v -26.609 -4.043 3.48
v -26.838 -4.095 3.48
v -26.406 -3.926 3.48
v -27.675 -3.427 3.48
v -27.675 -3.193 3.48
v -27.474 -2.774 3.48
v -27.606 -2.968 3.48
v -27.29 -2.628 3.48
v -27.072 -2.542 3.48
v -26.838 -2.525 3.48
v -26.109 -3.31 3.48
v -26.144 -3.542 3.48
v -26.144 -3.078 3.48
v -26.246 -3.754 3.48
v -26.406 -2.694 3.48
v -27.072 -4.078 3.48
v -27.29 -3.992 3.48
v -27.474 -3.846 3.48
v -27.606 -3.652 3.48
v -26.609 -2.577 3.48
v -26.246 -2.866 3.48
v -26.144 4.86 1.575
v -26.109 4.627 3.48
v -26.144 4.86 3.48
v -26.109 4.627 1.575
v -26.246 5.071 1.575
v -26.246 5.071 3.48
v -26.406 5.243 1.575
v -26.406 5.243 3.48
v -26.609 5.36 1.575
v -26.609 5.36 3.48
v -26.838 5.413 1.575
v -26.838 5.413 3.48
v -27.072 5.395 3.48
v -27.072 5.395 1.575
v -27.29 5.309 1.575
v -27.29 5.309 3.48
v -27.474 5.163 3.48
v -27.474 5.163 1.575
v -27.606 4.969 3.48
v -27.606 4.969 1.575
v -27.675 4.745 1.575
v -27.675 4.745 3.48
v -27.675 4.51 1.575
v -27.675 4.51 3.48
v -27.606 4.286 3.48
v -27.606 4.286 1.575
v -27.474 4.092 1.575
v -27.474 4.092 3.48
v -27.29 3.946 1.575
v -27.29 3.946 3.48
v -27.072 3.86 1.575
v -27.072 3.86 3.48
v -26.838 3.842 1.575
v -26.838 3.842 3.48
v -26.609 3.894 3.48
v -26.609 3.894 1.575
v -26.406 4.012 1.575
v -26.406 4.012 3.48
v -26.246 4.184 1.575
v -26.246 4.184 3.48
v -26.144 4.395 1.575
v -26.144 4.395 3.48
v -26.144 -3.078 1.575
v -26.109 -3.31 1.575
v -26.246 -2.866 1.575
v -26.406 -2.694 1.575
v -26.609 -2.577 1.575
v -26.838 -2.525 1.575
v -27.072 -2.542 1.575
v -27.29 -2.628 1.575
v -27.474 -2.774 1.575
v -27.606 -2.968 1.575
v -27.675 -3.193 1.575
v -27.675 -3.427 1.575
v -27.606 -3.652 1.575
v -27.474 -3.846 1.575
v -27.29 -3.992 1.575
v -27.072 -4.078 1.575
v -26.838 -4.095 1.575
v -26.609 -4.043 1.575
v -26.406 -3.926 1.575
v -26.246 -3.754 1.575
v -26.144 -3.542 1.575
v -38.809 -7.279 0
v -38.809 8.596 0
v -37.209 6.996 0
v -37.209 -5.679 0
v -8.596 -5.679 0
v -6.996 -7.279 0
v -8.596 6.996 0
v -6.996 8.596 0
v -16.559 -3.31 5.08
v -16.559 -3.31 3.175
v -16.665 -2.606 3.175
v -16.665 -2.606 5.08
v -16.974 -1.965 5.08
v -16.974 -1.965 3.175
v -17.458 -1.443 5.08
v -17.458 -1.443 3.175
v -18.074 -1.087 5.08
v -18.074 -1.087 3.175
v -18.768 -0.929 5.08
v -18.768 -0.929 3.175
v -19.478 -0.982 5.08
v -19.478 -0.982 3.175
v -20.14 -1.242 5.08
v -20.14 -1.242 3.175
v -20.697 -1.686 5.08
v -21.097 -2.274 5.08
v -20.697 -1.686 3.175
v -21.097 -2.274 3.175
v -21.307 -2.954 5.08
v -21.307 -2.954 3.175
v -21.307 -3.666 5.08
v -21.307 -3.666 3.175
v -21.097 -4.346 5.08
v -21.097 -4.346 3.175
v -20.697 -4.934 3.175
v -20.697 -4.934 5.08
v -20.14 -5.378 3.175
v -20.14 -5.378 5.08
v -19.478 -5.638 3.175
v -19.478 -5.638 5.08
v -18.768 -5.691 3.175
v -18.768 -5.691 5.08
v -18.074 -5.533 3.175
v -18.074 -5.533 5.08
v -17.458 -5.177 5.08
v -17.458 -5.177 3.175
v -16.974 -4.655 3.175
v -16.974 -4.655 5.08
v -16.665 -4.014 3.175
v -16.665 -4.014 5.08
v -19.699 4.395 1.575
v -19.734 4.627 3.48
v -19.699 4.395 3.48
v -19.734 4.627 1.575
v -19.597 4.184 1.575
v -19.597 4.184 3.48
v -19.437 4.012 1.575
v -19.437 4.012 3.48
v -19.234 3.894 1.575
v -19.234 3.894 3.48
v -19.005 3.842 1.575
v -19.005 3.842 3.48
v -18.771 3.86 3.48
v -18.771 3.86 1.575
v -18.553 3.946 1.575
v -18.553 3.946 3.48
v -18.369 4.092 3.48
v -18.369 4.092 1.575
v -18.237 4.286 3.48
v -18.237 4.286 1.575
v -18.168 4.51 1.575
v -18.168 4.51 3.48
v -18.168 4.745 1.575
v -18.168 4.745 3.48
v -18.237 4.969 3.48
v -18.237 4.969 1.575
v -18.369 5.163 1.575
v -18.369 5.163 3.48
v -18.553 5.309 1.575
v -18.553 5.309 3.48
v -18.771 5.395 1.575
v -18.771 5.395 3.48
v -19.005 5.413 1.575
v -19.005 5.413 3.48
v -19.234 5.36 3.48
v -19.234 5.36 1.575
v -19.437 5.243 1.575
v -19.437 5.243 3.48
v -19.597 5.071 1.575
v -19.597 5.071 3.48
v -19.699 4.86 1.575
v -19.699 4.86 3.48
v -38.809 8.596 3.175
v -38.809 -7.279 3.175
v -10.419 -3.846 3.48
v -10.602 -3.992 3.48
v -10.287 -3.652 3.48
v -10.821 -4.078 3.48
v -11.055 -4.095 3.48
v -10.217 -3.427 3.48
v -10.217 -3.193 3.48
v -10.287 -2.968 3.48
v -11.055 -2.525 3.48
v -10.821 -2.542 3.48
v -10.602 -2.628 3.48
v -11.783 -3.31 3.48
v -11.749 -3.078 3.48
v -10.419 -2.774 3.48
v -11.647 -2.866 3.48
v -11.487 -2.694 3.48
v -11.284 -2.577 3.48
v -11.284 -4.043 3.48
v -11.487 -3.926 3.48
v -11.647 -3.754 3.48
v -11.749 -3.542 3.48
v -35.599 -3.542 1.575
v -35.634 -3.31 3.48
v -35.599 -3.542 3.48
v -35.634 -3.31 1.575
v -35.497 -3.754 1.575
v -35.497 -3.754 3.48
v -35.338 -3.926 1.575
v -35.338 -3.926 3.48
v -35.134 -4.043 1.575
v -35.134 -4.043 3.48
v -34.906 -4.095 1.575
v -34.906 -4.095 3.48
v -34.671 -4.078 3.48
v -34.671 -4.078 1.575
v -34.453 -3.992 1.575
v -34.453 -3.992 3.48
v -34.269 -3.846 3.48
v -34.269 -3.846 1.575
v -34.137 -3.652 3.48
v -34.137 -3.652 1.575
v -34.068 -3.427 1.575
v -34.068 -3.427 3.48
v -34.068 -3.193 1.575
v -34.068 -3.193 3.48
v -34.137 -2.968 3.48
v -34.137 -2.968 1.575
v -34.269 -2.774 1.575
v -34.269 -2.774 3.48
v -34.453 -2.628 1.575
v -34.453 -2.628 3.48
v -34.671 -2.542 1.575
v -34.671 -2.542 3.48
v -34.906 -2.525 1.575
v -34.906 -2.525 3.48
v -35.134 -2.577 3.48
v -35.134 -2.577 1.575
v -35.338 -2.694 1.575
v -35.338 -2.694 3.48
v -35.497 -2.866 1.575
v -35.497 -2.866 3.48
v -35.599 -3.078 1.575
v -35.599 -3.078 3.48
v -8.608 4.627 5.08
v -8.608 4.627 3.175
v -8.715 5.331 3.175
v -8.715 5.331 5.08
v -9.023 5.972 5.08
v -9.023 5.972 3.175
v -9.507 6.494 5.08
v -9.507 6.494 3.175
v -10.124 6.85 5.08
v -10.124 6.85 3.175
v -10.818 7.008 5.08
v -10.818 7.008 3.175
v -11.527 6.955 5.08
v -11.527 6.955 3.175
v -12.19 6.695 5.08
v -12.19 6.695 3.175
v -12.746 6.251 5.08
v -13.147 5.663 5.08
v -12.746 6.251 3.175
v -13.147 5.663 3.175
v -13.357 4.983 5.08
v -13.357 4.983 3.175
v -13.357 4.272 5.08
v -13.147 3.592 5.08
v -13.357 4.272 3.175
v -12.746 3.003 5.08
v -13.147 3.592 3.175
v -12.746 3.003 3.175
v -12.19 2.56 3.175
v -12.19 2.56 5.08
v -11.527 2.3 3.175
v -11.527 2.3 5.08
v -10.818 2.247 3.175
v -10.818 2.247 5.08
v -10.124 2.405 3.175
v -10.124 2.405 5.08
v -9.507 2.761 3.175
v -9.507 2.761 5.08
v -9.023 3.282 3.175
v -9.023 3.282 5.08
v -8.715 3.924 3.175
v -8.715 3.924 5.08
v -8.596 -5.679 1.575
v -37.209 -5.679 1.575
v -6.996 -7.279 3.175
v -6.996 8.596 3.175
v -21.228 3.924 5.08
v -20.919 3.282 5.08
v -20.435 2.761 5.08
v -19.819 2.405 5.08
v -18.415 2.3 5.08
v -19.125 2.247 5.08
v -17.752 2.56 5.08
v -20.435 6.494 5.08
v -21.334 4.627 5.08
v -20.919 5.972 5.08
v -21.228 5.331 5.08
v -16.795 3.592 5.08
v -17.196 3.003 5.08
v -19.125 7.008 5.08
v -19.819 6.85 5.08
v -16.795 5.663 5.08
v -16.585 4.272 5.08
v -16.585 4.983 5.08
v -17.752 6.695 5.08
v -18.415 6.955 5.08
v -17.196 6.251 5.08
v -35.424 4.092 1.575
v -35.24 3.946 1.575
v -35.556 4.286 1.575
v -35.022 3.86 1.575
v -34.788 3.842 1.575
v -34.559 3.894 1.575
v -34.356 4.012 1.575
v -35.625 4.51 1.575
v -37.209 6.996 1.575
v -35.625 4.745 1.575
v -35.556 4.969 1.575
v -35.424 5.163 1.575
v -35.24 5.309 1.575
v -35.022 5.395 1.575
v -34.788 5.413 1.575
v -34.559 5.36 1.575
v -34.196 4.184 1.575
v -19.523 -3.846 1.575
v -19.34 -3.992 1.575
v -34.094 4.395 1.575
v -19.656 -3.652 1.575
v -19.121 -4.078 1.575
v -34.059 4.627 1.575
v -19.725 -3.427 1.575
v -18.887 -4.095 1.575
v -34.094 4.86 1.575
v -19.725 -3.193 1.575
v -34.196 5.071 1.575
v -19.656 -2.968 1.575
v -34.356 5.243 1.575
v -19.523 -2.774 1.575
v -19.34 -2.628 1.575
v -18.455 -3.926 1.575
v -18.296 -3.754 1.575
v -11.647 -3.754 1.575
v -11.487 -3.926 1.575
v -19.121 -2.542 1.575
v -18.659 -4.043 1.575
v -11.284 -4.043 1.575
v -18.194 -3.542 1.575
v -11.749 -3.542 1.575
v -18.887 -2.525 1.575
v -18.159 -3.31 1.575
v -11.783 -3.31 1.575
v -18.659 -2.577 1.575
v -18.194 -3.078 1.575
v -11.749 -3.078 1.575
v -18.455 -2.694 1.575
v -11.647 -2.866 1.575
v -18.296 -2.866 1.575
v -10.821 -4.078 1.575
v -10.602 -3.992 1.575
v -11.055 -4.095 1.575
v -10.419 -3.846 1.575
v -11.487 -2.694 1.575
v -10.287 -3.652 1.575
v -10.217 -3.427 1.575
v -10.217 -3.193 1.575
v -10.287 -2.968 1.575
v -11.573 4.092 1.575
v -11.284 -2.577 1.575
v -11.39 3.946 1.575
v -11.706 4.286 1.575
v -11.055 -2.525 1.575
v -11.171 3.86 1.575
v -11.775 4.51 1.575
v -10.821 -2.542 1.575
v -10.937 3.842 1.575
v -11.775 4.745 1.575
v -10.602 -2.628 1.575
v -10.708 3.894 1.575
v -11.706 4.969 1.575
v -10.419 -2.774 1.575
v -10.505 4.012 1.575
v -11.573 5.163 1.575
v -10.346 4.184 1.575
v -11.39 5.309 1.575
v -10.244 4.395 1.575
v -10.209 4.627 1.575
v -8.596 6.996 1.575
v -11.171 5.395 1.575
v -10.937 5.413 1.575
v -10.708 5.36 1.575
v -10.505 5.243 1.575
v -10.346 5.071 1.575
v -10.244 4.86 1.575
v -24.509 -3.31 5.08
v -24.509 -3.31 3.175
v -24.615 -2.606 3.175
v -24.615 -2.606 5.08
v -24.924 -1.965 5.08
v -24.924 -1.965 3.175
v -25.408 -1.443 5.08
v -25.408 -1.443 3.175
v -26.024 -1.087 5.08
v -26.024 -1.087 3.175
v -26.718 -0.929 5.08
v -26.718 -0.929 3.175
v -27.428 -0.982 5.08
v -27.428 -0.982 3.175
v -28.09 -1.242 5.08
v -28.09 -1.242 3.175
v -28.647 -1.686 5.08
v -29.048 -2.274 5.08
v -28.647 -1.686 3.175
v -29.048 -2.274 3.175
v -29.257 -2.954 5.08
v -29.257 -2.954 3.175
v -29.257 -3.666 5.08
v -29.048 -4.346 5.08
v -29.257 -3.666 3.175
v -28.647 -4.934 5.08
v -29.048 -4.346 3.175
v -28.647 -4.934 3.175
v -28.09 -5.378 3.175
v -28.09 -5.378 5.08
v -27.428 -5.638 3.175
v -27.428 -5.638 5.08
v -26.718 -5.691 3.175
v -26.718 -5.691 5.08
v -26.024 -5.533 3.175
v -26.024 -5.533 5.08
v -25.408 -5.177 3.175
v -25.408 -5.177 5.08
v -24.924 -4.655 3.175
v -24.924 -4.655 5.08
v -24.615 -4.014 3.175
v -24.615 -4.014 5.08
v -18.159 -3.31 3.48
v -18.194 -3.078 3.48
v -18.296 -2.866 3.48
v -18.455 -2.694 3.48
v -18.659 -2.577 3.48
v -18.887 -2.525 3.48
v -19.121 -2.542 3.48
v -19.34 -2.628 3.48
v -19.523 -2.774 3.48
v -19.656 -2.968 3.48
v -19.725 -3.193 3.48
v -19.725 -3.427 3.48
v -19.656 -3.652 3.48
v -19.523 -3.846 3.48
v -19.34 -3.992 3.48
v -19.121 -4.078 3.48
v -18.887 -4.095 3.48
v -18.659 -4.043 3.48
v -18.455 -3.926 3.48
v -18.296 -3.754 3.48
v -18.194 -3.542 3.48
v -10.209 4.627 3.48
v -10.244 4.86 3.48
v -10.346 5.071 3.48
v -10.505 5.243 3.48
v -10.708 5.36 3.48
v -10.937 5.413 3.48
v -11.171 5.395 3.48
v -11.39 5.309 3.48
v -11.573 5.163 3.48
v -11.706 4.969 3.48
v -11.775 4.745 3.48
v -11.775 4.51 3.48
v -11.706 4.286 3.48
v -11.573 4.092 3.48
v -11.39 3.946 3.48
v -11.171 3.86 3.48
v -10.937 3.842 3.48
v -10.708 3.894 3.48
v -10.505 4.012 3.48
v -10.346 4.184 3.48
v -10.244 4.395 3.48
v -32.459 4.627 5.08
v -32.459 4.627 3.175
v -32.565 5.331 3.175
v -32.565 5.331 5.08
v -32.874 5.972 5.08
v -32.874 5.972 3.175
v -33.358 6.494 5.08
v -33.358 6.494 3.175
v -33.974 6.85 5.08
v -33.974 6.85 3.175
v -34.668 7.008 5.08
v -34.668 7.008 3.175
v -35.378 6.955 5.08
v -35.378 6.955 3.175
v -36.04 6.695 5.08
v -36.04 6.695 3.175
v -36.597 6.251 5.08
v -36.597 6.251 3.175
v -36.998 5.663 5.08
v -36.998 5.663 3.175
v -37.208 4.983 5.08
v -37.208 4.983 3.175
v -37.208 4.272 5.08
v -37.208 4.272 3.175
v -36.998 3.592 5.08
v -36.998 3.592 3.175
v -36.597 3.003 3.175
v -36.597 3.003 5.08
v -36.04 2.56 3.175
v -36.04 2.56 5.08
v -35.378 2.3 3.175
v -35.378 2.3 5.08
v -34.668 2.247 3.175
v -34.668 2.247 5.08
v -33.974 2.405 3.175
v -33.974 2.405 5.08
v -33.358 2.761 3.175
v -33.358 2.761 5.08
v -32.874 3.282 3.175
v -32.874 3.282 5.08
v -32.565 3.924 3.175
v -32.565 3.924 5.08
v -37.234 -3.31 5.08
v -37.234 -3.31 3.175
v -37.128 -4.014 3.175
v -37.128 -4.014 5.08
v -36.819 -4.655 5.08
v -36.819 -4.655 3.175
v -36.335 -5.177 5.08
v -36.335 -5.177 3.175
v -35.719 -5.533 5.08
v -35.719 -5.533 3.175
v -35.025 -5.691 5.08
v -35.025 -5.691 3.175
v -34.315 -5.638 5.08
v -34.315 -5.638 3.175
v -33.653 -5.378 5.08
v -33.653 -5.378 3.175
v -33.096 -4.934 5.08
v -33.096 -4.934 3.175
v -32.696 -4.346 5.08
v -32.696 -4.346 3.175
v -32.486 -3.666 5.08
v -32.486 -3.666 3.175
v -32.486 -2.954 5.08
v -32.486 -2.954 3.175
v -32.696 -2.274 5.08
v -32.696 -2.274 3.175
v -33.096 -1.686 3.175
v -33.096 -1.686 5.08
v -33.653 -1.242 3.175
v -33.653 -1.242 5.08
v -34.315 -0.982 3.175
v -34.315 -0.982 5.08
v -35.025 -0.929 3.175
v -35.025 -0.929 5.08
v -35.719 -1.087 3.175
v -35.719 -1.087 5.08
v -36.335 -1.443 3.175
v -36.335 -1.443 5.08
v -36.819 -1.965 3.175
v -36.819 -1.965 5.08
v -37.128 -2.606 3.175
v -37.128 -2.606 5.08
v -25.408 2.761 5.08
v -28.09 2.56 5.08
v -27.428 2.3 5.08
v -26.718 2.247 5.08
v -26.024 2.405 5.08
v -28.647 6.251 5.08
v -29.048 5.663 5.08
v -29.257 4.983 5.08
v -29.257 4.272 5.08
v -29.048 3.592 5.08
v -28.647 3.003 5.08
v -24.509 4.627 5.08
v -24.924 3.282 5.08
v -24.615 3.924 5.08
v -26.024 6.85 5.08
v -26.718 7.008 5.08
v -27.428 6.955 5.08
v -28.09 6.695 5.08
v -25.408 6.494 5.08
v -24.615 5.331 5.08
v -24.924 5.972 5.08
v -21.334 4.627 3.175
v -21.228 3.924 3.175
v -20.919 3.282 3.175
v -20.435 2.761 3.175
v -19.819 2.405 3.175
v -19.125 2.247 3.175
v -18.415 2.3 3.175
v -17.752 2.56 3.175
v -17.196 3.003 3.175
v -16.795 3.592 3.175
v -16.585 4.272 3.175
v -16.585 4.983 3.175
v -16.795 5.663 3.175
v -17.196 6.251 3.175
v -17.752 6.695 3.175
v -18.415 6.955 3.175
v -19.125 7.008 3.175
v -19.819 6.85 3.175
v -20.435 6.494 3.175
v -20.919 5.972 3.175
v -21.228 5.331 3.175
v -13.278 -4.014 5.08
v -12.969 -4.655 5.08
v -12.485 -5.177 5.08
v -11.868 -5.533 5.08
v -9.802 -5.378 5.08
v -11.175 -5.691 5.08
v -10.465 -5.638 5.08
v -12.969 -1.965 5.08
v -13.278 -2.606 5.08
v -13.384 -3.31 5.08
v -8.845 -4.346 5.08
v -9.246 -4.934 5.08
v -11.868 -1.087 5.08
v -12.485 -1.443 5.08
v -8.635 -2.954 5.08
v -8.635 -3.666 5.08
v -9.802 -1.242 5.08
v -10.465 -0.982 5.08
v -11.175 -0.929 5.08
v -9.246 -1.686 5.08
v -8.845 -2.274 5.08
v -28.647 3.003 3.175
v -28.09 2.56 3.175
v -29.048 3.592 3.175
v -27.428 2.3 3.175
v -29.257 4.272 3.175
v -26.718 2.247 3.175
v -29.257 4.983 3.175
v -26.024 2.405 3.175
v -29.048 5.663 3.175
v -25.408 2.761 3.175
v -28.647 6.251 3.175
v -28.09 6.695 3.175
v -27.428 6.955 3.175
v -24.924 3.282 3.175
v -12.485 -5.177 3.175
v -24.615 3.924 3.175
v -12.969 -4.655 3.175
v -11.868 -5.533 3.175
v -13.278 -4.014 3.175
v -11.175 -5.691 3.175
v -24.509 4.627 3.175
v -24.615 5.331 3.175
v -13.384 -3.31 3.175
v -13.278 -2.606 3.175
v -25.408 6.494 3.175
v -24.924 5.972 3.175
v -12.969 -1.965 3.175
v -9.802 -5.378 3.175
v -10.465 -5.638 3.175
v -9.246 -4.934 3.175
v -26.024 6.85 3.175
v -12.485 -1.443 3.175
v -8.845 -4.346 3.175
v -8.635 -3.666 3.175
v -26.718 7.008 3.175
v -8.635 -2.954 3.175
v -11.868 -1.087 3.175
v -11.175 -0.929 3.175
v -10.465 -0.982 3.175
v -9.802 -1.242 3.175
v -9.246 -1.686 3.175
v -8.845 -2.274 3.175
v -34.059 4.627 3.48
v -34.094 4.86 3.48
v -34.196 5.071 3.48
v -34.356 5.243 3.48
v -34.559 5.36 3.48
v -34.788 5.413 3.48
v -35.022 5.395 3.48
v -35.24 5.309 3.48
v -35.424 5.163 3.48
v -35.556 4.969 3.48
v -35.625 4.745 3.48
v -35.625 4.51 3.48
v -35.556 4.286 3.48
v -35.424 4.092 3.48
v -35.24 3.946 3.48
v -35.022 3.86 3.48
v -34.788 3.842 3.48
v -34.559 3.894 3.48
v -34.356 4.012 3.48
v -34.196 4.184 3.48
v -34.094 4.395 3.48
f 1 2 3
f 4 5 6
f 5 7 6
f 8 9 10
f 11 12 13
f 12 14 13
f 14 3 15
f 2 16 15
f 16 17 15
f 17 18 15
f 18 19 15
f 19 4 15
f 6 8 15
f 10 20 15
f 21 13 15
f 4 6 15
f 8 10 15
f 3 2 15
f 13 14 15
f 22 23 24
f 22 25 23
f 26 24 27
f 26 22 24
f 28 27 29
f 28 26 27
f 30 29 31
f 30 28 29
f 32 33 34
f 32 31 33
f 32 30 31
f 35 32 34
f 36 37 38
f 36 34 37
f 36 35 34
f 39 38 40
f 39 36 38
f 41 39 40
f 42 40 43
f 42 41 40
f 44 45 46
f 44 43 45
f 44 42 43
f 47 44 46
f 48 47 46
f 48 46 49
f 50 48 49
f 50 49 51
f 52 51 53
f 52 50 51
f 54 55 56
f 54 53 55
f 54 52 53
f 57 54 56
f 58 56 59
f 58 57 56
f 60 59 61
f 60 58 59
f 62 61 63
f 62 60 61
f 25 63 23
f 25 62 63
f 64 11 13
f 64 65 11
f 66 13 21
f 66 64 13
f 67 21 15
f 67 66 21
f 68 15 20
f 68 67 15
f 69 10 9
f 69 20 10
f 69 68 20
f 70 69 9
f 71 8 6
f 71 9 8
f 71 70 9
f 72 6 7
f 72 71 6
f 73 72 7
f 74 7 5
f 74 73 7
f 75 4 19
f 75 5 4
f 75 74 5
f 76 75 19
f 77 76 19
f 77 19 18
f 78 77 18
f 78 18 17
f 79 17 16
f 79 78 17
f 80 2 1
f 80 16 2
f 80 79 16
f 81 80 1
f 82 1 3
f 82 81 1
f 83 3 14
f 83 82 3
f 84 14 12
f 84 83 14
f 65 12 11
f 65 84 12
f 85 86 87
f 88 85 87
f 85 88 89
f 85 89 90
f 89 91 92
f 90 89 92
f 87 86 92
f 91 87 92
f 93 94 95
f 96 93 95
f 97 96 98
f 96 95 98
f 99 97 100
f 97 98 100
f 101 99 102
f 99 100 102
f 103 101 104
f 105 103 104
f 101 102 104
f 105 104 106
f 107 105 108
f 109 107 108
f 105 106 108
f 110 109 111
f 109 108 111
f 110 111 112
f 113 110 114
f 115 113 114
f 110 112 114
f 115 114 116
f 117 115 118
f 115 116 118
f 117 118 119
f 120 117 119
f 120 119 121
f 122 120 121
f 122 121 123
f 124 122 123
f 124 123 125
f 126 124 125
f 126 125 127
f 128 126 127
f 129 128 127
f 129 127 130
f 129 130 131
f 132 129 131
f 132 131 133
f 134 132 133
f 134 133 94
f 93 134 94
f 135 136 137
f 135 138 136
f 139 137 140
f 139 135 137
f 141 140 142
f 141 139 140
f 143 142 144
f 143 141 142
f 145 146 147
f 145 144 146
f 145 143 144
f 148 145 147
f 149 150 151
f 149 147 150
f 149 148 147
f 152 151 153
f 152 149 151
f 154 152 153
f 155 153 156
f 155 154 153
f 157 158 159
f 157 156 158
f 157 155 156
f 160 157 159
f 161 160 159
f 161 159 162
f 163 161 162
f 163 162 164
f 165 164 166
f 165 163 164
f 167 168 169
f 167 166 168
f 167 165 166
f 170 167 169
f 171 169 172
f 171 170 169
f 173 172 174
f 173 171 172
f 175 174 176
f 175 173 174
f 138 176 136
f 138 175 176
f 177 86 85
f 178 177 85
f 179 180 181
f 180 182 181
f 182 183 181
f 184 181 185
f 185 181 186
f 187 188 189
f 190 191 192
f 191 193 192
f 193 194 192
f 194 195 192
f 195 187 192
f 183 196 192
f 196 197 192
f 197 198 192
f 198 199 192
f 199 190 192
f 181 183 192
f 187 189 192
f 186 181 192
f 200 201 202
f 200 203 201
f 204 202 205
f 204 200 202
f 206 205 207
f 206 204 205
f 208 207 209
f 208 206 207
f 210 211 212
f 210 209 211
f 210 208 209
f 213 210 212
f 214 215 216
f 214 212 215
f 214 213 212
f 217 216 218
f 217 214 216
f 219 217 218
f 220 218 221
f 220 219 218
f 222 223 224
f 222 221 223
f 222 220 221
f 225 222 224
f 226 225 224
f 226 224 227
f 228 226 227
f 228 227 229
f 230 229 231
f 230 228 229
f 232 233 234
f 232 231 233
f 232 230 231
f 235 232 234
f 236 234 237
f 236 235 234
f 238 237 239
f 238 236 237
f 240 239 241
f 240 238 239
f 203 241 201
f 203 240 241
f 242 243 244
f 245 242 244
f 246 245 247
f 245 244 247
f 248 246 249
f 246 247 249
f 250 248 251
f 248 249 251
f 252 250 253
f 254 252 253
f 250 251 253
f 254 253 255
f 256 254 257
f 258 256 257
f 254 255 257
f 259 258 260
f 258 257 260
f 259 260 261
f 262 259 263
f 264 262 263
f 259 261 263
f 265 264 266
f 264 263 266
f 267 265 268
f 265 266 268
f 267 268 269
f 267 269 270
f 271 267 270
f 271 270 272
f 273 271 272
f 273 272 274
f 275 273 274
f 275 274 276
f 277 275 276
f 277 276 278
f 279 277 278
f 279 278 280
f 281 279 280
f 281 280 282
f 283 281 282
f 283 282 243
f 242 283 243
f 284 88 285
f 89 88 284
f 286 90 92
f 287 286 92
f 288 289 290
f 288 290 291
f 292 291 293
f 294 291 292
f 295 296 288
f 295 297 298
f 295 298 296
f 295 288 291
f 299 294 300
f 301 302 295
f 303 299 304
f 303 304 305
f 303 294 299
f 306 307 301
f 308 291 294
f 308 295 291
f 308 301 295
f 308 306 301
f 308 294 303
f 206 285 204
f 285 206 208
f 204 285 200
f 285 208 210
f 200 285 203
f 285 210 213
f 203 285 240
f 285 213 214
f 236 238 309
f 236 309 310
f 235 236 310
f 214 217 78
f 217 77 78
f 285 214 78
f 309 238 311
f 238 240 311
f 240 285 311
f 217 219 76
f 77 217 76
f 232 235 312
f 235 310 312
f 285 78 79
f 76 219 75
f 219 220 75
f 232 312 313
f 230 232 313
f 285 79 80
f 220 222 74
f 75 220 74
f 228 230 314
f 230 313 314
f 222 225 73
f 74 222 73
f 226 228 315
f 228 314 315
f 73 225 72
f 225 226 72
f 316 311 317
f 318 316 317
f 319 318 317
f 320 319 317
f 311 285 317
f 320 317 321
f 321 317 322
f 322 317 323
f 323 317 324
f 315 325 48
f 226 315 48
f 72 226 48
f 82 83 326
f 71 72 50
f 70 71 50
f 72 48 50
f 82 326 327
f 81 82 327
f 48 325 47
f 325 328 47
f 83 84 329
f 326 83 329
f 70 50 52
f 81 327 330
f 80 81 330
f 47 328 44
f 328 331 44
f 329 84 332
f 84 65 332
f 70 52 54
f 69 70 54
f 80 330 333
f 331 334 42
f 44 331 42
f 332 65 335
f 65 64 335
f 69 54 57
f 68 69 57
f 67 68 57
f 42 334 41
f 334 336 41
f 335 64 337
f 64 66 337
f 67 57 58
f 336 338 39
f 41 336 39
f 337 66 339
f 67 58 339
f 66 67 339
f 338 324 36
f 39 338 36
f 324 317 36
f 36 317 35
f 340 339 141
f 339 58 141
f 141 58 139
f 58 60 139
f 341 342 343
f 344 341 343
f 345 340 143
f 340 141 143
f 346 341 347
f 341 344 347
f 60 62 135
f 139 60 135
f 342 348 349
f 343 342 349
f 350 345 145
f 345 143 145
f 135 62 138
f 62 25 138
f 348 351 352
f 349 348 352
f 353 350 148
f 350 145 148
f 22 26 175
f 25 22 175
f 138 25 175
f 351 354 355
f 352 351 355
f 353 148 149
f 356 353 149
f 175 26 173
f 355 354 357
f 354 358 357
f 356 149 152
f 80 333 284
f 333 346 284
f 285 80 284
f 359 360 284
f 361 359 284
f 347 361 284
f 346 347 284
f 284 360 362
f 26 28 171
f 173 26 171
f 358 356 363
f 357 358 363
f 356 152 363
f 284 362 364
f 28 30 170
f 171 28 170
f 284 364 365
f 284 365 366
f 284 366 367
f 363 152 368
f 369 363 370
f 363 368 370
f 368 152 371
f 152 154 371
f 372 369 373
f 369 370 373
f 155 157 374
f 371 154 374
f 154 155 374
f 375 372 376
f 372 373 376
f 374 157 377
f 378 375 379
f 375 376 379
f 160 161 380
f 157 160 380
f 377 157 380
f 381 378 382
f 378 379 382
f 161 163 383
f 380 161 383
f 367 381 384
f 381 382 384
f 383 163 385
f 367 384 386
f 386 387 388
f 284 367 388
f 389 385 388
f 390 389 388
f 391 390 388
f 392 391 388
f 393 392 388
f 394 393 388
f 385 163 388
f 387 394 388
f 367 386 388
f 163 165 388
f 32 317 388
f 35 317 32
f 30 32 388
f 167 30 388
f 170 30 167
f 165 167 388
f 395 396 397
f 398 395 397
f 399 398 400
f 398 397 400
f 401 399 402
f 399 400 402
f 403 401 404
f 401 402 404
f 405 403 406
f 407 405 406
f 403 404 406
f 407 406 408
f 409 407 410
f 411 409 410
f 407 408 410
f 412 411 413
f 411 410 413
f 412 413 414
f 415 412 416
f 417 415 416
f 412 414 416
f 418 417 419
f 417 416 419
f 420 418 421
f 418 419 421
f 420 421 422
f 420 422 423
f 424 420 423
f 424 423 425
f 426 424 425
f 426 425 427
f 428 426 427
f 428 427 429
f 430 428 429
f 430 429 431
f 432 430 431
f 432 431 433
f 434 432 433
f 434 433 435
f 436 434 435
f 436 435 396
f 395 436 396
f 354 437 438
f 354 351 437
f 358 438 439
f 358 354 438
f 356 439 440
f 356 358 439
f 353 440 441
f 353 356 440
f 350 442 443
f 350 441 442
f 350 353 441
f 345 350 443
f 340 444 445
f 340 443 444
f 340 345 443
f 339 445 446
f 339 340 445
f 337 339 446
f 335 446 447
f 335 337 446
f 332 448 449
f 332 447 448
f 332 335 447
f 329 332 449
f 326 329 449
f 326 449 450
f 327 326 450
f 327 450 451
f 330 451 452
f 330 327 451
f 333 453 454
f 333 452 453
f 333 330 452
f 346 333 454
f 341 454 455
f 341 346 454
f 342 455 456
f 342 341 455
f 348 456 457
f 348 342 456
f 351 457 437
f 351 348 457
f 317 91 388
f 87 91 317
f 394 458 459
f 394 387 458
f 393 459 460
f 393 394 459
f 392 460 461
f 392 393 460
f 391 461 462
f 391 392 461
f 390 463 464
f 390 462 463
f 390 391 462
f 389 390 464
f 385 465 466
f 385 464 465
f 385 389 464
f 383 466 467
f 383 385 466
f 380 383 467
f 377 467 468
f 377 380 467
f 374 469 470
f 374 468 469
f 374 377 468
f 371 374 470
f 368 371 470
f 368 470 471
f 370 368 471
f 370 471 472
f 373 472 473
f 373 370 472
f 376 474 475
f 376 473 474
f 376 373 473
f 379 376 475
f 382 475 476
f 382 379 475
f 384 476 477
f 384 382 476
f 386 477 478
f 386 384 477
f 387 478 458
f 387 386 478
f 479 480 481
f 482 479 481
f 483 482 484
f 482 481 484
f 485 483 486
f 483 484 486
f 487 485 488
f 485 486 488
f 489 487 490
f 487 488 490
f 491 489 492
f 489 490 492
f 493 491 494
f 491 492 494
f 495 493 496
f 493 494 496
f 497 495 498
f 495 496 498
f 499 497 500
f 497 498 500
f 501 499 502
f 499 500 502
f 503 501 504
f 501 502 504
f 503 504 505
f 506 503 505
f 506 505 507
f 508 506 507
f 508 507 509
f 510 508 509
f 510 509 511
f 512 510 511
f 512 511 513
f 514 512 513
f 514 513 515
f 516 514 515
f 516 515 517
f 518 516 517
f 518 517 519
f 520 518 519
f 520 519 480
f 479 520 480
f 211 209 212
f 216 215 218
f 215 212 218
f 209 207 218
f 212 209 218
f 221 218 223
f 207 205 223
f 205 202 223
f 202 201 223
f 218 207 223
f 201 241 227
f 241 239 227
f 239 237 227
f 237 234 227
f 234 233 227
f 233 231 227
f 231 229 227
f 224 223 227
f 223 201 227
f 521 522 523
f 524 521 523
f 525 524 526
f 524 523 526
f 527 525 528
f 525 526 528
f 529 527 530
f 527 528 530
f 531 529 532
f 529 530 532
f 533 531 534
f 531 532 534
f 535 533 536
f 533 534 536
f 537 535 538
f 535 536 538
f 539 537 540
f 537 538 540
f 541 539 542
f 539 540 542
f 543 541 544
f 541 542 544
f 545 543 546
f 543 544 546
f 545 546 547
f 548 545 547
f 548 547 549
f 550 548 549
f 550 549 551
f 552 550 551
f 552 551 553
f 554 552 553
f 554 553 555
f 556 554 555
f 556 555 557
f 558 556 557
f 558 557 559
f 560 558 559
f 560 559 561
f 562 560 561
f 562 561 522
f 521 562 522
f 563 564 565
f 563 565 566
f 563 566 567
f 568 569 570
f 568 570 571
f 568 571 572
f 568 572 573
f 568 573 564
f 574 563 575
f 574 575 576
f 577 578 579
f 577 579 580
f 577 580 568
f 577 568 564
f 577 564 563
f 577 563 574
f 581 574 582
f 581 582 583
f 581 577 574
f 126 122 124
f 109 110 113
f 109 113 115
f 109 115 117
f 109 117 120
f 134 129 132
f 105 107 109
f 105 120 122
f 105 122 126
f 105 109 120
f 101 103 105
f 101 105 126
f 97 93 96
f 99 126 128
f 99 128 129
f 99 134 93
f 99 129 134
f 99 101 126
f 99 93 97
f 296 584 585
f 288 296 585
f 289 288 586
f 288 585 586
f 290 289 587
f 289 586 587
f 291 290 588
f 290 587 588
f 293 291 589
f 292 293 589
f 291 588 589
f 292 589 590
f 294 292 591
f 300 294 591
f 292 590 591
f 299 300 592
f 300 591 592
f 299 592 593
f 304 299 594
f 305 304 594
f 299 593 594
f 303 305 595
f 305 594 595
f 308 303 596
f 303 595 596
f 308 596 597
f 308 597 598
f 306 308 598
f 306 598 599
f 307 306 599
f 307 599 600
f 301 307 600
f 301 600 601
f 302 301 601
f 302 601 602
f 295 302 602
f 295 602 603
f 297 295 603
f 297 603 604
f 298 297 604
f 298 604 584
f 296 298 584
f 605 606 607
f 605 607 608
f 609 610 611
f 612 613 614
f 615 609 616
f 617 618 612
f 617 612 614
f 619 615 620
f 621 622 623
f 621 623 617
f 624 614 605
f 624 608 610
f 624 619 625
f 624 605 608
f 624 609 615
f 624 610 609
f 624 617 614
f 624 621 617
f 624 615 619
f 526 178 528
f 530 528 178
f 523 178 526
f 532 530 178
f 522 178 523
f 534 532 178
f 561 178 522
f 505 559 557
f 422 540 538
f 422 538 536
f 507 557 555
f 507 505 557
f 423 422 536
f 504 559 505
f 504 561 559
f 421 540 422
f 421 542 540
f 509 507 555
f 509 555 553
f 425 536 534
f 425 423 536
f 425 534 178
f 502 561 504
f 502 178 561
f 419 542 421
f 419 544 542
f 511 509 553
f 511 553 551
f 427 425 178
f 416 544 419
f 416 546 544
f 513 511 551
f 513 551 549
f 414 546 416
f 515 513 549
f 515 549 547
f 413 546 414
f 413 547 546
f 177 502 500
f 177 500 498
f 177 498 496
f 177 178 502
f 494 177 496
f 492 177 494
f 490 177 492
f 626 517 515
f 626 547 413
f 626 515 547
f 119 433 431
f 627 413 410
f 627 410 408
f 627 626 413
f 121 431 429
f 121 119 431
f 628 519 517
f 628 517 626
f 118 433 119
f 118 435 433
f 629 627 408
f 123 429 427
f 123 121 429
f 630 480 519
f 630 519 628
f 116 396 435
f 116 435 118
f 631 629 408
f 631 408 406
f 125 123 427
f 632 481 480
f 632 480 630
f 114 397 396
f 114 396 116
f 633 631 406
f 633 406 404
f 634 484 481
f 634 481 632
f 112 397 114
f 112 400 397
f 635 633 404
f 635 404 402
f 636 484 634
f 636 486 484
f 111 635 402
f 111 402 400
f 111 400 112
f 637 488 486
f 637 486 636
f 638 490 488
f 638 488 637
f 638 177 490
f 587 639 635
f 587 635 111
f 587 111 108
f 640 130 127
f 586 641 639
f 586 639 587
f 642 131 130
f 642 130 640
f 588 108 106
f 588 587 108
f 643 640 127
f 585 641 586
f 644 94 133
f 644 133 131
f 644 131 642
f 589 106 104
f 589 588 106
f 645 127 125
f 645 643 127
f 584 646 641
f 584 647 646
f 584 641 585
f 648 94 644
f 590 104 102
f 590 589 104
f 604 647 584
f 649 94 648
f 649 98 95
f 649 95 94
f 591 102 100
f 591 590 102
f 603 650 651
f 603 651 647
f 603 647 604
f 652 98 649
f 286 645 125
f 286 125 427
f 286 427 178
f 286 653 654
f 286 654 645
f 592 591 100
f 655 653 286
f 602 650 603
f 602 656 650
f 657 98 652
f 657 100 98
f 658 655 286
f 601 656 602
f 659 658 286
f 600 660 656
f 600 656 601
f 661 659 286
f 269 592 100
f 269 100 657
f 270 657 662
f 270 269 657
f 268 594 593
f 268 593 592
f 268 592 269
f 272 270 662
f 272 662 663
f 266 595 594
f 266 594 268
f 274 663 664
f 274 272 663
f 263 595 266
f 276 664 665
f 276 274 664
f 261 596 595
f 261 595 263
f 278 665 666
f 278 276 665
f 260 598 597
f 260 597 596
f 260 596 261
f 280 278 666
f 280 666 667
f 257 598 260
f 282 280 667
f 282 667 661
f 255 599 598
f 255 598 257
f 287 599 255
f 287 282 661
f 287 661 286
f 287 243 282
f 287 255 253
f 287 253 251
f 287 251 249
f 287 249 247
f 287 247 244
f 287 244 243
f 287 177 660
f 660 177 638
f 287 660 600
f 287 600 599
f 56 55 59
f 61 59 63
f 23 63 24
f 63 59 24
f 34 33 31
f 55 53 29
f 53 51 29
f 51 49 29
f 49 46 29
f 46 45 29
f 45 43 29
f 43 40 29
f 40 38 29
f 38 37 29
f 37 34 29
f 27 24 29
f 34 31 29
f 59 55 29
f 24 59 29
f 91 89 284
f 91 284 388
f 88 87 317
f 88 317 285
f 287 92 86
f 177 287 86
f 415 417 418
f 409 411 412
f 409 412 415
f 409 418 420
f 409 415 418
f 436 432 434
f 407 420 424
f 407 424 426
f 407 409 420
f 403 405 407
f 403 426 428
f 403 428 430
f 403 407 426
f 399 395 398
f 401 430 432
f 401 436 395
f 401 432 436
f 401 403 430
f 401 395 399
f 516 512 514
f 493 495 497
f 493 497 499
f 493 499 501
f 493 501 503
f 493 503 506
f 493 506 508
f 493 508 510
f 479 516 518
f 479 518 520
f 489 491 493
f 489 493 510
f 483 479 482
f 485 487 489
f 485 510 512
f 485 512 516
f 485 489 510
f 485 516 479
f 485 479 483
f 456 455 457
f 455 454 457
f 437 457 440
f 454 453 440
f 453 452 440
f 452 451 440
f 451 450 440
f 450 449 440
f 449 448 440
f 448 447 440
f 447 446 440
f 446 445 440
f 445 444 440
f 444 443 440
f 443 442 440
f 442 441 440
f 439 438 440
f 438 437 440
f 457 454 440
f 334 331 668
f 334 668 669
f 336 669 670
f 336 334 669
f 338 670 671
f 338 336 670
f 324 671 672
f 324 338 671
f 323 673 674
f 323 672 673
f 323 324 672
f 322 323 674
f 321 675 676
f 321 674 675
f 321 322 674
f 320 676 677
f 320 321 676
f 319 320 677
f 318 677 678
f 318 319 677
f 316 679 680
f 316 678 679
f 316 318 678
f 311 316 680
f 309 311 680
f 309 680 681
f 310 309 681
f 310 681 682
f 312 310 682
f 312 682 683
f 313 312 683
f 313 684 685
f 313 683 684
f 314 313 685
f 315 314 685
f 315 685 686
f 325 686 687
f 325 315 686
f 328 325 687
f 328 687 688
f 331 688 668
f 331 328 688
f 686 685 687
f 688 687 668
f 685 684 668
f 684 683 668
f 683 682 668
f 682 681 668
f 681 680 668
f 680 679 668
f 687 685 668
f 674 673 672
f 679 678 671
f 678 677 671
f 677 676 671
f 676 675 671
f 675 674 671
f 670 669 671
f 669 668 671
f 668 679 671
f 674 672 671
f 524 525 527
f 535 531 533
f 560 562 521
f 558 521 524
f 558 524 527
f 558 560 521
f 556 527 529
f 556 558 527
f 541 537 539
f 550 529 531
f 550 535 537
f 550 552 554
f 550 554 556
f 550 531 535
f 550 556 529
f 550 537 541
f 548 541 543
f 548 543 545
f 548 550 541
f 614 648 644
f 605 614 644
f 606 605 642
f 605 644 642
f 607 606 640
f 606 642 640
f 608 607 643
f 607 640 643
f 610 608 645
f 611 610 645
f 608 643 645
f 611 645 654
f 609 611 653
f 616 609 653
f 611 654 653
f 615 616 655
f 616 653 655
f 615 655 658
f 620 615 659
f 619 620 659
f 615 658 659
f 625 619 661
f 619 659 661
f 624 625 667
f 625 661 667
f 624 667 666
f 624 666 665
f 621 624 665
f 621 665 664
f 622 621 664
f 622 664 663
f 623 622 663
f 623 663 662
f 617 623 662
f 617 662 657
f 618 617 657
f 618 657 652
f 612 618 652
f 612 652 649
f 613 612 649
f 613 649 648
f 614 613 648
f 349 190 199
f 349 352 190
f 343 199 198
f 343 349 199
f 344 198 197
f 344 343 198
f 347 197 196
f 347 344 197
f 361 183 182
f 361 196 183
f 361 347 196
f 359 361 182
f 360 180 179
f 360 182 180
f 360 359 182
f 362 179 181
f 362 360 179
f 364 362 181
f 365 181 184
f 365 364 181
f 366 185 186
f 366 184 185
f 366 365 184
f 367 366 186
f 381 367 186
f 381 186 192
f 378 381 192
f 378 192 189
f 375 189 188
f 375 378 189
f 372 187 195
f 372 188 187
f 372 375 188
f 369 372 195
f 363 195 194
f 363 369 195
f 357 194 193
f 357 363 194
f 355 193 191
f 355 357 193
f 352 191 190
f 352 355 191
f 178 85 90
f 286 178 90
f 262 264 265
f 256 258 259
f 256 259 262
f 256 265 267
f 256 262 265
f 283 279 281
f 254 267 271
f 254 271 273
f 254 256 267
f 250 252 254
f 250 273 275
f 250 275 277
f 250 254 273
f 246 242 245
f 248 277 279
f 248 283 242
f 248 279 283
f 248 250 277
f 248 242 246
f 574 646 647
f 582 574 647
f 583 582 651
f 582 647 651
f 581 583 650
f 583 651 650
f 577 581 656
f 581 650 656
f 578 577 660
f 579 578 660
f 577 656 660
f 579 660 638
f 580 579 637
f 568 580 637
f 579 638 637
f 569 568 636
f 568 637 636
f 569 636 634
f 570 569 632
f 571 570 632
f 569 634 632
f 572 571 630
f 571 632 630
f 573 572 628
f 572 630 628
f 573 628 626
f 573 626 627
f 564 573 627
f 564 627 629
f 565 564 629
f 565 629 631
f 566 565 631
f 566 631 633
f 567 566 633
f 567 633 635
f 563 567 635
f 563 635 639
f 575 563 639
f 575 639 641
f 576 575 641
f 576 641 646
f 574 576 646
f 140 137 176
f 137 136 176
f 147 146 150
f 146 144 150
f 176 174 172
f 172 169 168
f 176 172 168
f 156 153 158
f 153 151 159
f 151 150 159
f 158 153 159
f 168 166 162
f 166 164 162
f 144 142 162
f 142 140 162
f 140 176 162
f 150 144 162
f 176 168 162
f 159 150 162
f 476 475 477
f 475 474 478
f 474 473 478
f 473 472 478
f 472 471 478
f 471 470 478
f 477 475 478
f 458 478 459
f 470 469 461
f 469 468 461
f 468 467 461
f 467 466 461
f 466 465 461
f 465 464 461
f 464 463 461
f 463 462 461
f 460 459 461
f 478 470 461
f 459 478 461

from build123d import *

# Parameters (mm, degrees)
F1_DEPTH = 3.175
F2_DEPTH = 5.08
F3_T     = -1.6002


# Not quite as in the source:
# - a feature names something its author has since deleted; it is built from what else it names


with BuildPart() as f1:
    # F0 (on Top) → F1 (new body)
    with BuildSketch(Plane.XY):
        with BuildLine():
            Line((-6.9955831819, 8.5962191019), (-38.8090831819, 8.5962191019))
            Line((-38.8090831819, 8.5962191019), (-38.8090831819, 4.6274691019))
            Line((-38.8090831819, 4.6274691019), (-37.2342831819, 4.6274691019))
            ThreePointArc((-37.2342831819, 4.6274691019), (-34.8466831819, 7.0150691019), (-32.4590831819, 4.6274691019))
            Line((-32.4590831819, 4.6274691019), (-29.2840831819, 4.6274691019))
            ThreePointArc((-29.2840831819, 4.6274691019), (-26.8964831819, 7.0150691019), (-24.5088831819, 4.6274691019))
            Line((-24.5088831819, 4.6274691019), (-21.3338831819, 4.6274691019))
            ThreePointArc((-21.3338831819, 4.6274691019), (-18.9462831819, 7.0150691019), (-16.5586831819, 4.6274691019))
            Line((-16.5586831819, 4.6274691019), (-13.3836831819, 4.6274691019))
            ThreePointArc((-13.3836831819, 4.6274691019), (-10.9960831819, 7.0150691019), (-8.6084831819, 4.6274691019))
            Line((-8.6084831819, 4.6274691019), (-6.9955831819, 4.6274691019))
            Line((-6.9955831819, 4.6274691019), (-6.9955831819, 8.5962191019))
        make_face()
        with BuildLine():
            Line((-37.2342831819, 4.6274691019), (-38.8090831819, 4.6274691019))
            Line((-38.8090831819, 4.6274691019), (-38.8090831819, 0.6587191019))
            Line((-38.8090831819, 0.6587191019), (-6.9955831819, 0.6587191019))
            Line((-6.9955831819, 0.6587191019), (-6.9955831819, 4.6274691019))
            Line((-6.9955831819, 4.6274691019), (-8.6084831819, 4.6274691019))
            ThreePointArc((-8.6084831819, 4.6274691019), (-10.9960831819, 2.2398691019), (-13.3836831819, 4.6274691019))
            Line((-13.3836831819, 4.6274691019), (-16.5586831819, 4.6274691019))
            ThreePointArc((-16.5586831819, 4.6274691019), (-18.9462831819, 2.2398691019), (-21.3338831819, 4.6274691019))
            Line((-21.3338831819, 4.6274691019), (-24.5088831819, 4.6274691019))
            ThreePointArc((-24.5088831819, 4.6274691019), (-26.8964831819, 2.2398691019), (-29.2840831819, 4.6274691019))
            Line((-29.2840831819, 4.6274691019), (-32.4590831819, 4.6274691019))
            ThreePointArc((-32.4590831819, 4.6274691019), (-34.8466831819, 2.2398691019), (-37.2342831819, 4.6274691019))
        make_face()
        with BuildLine():
            Line((-37.2342831819, -3.3100308981), (-38.8090831819, -3.3100308981))
            Line((-38.8090831819, -3.3100308981), (-38.8090831819, -7.2787808981))
            Line((-38.8090831819, -7.2787808981), (-6.9955831819, -7.2787808981))
            Line((-6.9955831819, -7.2787808981), (-6.9955831819, -3.3100308981))
            Line((-6.9955831819, -3.3100308981), (-8.6084831819, -3.3100308981))
            ThreePointArc((-8.6084831819, -3.3100308981), (-10.9960831819, -5.6976308981), (-13.3836831819, -3.3100308981))
            Line((-13.3836831819, -3.3100308981), (-16.5586831819, -3.3100308981))
            ThreePointArc((-16.5586831819, -3.3100308981), (-18.9462831819, -5.6976308981), (-21.3338831819, -3.3100308981))
            Line((-21.3338831819, -3.3100308981), (-24.5088831819, -3.3100308981))
            ThreePointArc((-24.5088831819, -3.3100308981), (-26.8964831819, -5.6976308981), (-29.2840831819, -3.3100308981))
            Line((-29.2840831819, -3.3100308981), (-32.4590831819, -3.3100308981))
            ThreePointArc((-32.4590831819, -3.3100308981), (-34.8466831819, -5.6976308981), (-37.2342831819, -3.3100308981))
        make_face()
        with BuildLine():
            Line((-6.9955831819, 0.6587191019), (-38.8090831819, 0.6587191019))
            Line((-38.8090831819, 0.6587191019), (-38.8090831819, -3.3100308981))
            Line((-38.8090831819, -3.3100308981), (-37.2342831819, -3.3100308981))
            ThreePointArc((-37.2342831819, -3.3100308981), (-34.8466831819, -0.9224308981), (-32.4590831819, -3.3100308981))
            Line((-32.4590831819, -3.3100308981), (-29.2840831819, -3.3100308981))
            ThreePointArc((-29.2840831819, -3.3100308981), (-26.8964831819, -0.9224308981), (-24.5088831819, -3.3100308981))
            Line((-24.5088831819, -3.3100308981), (-21.3338831819, -3.3100308981))
            ThreePointArc((-21.3338831819, -3.3100308981), (-18.9462831819, -0.9224308981), (-16.5586831819, -3.3100308981))
            Line((-16.5586831819, -3.3100308981), (-13.3836831819, -3.3100308981))
            ThreePointArc((-13.3836831819, -3.3100308981), (-10.9960831819, -0.9224308981), (-8.6084831819, -3.3100308981))
            Line((-8.6084831819, -3.3100308981), (-6.9955831819, -3.3100308981))
            Line((-6.9955831819, -3.3100308981), (-6.9955831819, 0.6587191019))
        make_face()
    extrude(amount=F1_DEPTH)

    # F0 (on Top) → F2 (join)
    with BuildSketch(Plane.XY):
        with BuildLine():
            Line((-32.4590831819, 4.6274691019), (-37.2342831819, 4.6274691019))
            ThreePointArc((-37.2342831819, 4.6274691019), (-34.8466831819, 2.2398691019), (-32.4590831819, 4.6274691019))
        make_face()
        with BuildLine():
            ThreePointArc((-32.4590831819, 4.6274691019), (-34.8466831819, 7.0150691019), (-37.2342831819, 4.6274691019))
            Line((-37.2342831819, 4.6274691019), (-32.4590831819, 4.6274691019))
        make_face()
        with BuildLine():
            ThreePointArc((-32.4590831819, -3.3100308981), (-34.8466831819, -0.9224308981), (-37.2342831819, -3.3100308981))
            Line((-37.2342831819, -3.3100308981), (-32.4590831819, -3.3100308981))
        make_face()
        with BuildLine():
            Line((-32.4590831819, -3.3100308981), (-37.2342831819, -3.3100308981))
            ThreePointArc((-37.2342831819, -3.3100308981), (-34.8466831819, -5.6976308981), (-32.4590831819, -3.3100308981))
        make_face()
        with BuildLine():
            Line((-24.5088831819, -3.3100308981), (-29.2840831819, -3.3100308981))
            ThreePointArc((-29.2840831819, -3.3100308981), (-26.8964831819, -5.6976308981), (-24.5088831819, -3.3100308981))
        make_face()
        with BuildLine():
            ThreePointArc((-24.5088831819, -3.3100308981), (-26.8964831819, -0.9224308981), (-29.2840831819, -3.3100308981))
            Line((-29.2840831819, -3.3100308981), (-24.5088831819, -3.3100308981))
        make_face()
        with BuildLine():
            Line((-24.5088831819, 4.6274691019), (-29.2840831819, 4.6274691019))
            ThreePointArc((-29.2840831819, 4.6274691019), (-26.8964831819, 2.2398691019), (-24.5088831819, 4.6274691019))
        make_face()
        with BuildLine():
            ThreePointArc((-24.5088831819, 4.6274691019), (-26.8964831819, 7.0150691019), (-29.2840831819, 4.6274691019))
            Line((-29.2840831819, 4.6274691019), (-24.5088831819, 4.6274691019))
        make_face()
        with BuildLine():
            ThreePointArc((-21.3338831819, -3.3100308981), (-18.9462831819, -5.6976308981), (-16.5586831819, -3.3100308981))
            Line((-16.5586831819, -3.3100308981), (-21.3338831819, -3.3100308981))
        make_face()
        with BuildLine():
            Line((-21.3338831819, -3.3100308981), (-16.5586831819, -3.3100308981))
            ThreePointArc((-16.5586831819, -3.3100308981), (-18.9462831819, -0.9224308981), (-21.3338831819, -3.3100308981))
        make_face()
        with BuildLine():
            Line((-21.3338831819, 4.6274691019), (-16.5586831819, 4.6274691019))
            ThreePointArc((-16.5586831819, 4.6274691019), (-18.9462831819, 7.0150691019), (-21.3338831819, 4.6274691019))
        make_face()
        with BuildLine():
            ThreePointArc((-21.3338831819, 4.6274691019), (-18.9462831819, 2.2398691019), (-16.5586831819, 4.6274691019))
            Line((-16.5586831819, 4.6274691019), (-21.3338831819, 4.6274691019))
        make_face()
        with BuildLine():
            Line((-13.3836831819, -3.3100308981), (-8.6084831819, -3.3100308981))
            ThreePointArc((-8.6084831819, -3.3100308981), (-10.9960831819, -0.9224308981), (-13.3836831819, -3.3100308981))
        make_face()
        with BuildLine():
            ThreePointArc((-13.3836831819, -3.3100308981), (-10.9960831819, -5.6976308981), (-8.6084831819, -3.3100308981))
            Line((-8.6084831819, -3.3100308981), (-13.3836831819, -3.3100308981))
        make_face()
        with BuildLine():
            ThreePointArc((-13.3836831819, 4.6274691019), (-10.9960831819, 2.2398691019), (-8.6084831819, 4.6274691019))
            Line((-8.6084831819, 4.6274691019), (-13.3836831819, 4.6274691019))
        make_face()
        with BuildLine():
            Line((-13.3836831819, 4.6274691019), (-8.6084831819, 4.6274691019))
            ThreePointArc((-8.6084831819, 4.6274691019), (-10.9960831819, 7.0150691019), (-13.3836831819, 4.6274691019))
        make_face()
    extrude(amount=F2_DEPTH)

    # F3
    f3_openings = [f1.faces().sort_by_distance(p)[0] for p in [
        (-22.902333, 0.658719, 0),
    ]]
    offset(amount=F3_T, openings=f3_openings, kind=Kind.INTERSECTION)


solid = f1.part
